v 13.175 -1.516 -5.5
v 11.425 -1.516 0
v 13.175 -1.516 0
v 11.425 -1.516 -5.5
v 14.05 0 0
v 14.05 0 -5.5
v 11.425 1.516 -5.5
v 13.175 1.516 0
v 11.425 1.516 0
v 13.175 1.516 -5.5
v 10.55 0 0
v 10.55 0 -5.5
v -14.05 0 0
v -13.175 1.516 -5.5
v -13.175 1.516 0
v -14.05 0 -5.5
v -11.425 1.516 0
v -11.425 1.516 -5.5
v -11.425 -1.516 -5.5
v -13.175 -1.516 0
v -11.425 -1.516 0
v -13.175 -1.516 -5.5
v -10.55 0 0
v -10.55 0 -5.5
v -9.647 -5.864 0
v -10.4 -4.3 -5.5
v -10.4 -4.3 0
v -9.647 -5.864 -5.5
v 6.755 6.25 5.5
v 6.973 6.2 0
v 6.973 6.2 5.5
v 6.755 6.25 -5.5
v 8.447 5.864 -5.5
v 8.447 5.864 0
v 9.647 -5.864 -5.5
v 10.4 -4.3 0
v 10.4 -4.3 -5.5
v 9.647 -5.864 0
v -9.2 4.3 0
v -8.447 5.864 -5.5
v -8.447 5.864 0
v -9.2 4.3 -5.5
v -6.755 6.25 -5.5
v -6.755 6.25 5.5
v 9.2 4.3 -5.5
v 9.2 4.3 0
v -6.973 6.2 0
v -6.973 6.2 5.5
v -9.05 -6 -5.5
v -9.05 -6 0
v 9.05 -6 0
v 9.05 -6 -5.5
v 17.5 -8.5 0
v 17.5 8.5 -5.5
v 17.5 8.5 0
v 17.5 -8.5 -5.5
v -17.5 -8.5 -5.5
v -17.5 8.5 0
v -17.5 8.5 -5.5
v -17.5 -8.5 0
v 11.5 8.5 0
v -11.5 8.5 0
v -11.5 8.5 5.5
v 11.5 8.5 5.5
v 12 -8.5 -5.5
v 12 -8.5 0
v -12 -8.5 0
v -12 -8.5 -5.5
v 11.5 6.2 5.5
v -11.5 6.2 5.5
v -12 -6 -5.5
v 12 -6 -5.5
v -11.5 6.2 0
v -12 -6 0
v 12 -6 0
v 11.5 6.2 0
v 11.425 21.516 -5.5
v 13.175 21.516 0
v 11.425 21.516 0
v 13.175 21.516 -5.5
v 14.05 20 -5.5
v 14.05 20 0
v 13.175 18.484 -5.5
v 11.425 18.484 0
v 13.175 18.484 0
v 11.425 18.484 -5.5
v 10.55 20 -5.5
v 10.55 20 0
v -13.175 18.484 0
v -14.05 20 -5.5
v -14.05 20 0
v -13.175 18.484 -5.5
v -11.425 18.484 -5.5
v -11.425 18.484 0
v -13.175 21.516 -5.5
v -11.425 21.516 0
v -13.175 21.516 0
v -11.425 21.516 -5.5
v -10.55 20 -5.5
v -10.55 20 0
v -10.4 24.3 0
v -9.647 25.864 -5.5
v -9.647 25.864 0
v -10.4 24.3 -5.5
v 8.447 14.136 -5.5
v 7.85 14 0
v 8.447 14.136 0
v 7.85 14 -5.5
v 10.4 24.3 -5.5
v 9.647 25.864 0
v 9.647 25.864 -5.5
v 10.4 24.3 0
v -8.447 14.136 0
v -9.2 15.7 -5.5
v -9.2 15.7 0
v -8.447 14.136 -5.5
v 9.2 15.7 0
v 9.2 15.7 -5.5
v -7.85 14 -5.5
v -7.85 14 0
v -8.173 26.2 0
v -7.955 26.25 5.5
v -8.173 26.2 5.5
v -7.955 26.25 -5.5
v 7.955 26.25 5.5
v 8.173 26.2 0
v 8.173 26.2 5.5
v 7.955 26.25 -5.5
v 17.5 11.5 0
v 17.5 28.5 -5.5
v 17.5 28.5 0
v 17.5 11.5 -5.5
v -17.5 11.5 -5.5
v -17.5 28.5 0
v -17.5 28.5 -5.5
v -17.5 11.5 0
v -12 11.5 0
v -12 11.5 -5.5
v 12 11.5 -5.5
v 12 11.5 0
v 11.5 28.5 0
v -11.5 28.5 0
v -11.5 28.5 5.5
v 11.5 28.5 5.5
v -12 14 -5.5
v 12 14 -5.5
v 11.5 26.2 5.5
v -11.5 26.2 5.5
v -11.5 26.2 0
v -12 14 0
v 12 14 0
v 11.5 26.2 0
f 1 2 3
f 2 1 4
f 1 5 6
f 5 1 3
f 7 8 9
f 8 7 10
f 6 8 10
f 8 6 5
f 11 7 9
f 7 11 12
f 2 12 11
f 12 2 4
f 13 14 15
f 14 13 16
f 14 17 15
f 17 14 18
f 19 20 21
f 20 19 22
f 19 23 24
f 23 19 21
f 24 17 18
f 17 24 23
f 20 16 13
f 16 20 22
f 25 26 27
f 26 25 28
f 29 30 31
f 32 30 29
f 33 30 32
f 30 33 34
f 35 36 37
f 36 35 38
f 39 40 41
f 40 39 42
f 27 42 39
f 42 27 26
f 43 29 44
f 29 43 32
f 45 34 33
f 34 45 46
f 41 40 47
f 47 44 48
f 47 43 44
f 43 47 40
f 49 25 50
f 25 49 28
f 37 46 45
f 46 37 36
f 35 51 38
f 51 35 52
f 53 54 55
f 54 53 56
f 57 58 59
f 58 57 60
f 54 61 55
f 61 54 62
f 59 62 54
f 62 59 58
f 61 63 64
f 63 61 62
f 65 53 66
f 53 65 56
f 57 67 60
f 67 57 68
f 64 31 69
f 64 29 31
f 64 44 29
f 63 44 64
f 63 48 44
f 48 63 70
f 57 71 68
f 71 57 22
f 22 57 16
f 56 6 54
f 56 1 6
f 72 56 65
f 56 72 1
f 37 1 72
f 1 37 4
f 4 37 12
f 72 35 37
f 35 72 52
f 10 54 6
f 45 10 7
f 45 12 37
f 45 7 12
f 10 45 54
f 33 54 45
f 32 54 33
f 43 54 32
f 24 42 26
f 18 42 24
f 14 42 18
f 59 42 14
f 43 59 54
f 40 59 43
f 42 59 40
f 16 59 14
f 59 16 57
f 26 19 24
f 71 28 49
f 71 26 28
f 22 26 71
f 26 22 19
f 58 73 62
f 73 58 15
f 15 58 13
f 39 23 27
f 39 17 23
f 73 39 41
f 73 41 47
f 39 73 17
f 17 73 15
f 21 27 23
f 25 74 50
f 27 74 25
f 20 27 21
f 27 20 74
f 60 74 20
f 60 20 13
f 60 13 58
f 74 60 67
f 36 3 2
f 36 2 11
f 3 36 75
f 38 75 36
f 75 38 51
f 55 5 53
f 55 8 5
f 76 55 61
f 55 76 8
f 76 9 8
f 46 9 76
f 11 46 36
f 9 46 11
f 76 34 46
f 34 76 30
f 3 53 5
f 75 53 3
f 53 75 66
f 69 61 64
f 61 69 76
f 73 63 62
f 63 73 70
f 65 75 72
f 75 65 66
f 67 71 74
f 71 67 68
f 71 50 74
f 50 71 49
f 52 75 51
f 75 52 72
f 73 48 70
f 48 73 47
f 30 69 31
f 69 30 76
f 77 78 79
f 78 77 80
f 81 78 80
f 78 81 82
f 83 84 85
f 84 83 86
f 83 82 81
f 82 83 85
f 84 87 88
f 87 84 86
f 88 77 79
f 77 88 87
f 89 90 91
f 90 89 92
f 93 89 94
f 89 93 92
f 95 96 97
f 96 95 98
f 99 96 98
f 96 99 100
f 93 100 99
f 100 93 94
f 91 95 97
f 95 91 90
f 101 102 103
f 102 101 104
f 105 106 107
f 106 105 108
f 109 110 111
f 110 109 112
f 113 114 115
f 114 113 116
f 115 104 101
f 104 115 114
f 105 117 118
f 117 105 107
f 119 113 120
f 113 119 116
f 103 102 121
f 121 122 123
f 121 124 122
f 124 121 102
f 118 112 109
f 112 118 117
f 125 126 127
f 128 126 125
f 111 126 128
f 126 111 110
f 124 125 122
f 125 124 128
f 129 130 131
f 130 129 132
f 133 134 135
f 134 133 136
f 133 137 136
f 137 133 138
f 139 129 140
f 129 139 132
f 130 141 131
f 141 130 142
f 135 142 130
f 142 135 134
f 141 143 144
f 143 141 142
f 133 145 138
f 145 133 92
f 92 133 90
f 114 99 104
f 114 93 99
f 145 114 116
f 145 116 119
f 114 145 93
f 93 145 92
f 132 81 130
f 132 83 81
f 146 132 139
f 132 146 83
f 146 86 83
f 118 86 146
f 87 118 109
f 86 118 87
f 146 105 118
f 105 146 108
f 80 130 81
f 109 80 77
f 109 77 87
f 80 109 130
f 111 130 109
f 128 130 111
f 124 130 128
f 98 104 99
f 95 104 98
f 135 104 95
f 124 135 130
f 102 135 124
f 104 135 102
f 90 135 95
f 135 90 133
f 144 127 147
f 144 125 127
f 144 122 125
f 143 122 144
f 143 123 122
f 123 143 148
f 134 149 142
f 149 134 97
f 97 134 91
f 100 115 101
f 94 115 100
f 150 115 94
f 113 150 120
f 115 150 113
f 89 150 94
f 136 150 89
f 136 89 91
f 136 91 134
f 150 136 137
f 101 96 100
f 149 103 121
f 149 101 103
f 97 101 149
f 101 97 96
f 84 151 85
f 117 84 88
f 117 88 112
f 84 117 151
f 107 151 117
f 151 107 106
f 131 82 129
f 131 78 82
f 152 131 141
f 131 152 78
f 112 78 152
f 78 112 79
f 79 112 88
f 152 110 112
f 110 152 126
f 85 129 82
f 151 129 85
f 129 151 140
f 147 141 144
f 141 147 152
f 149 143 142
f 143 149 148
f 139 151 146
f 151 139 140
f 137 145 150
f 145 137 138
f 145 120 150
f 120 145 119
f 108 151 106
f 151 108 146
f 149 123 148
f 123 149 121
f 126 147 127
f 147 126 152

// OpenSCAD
// file: lib/mhop_lib.scad
/*
	mhop_lib

    Autor: Marc Hoppe (mhop@posteo.de), Bielefeld 2018

    This program is free software: you can redistribute it and/or modify
    it under the terms of the GNU General Public License as published by
    the Free Software Foundation, either version 3 of the License, or
    (at your option) any later version.

    This program is distributed in the hope that it will be useful,
    but WITHOUT ANY WARRANTY; without even the implied warranty of
    MERCHANTABILITY or FITNESS FOR A PARTICULAR PURPOSE.  See the
    GNU General Public License for more details.

    You should have received a copy of the GNU General Public License
    along with this program.  If not, see <https://www.gnu.org/licenses/>.
*/

// Requires openscad >= 2016.XX]

use <shortcuts.scad>

*langloch();
*henkel_knick();
*henkel_halb(	h=20,
	b=5,
	ri=10,
	rr=2,
	L=200,
	H=50);
*rounded_prism(10,5,2);
*rounded_ring();



module MMx() { children(); mirror([1, 0, 0]) children(); }
module MMy() { children(); mirror([0, 1, 0]) children(); } 
module MMz() { children(); mirror([0, 0, 1]) children(); }

module langloch_senk(r=2.5,d=8,h=20)
{
	hull() {
	Tx(-d/2) Cy(r1=r, r2=2*r, h=h);
	Tx(+d/2) Cy(r1=r, r2=2*r, h=h);
	}
}

module langloch(r=2.5,d=8,h=20)
{
	hull() {
	Tx(-d/2) Cy(r=r, h=h);
	Tx(+d/2) Cy(r=r, h=h);
	}
}
	
module rounded_box(l,b,h,r,w)
{
	ri=r-w;
	off1=-w*2;
	off2=0;
	D() {
		rounded_cube(l=l+off2, b=b+off2, h=h+off2, r=r);
		rounded_cube(l=l+off1, b=b+off1, h=h+off1, r=ri);
	}
}


module rounded_cube(l,b,h,r=0.1)
{
	T(-l/2+r, -b/2+r, -h/2+r) { 
		d=2*r;
		hull() {
			Sp(r=r);
			Tx(l-d) Sp(r=r);
			Ty(b-d) Sp(r=r);
			Ty(b-d) Tx(l-d) Sp(r=r);
			Tz(h-d) Sp(r=r);
			Tz(h-d) Tx(l-d) Sp(r=r);
			Tz(h-d) Ty(b-d) Sp(r=r);
			Tz(h-d) Ty(b-d) Tx(l-d) Sp(r=r);
		}
	}
}

module rounded_trapez(l1,b1,l2,b2,h,r=0.1)
{
	//T(-l/2+r, -b/2+r, -h/2+r) 
	{ 
		d=2*r;
		
		hull() {
			Sp(r=r);
			Tx(l-d) Sp(r=r);
			Ty(b-d) Sp(r=r);
			Ty(b-d) Tx(l-d) Sp(r=r);
			Tz(h-d) Sp(r=r);
			Tz(h-d) Tx(l-d) Sp(r=r);
			Tz(h-d) Ty(b-d) Sp(r=r);
			Tz(h-d) Ty(b-d) Tx(l-d) Sp(r=r);
		}
	}
}

module rounded_prism(a,b,h,r=0.1)
{
	//T(-a/2+r, -b/2+r, -h/2+r) 
	{ 
		d=2*r;
		hull() {
			Sp(r=r);
			Tx(a-d) Sp(r=r);
			Ty(b-d) Sp(r=r);
			Tz(h-d) Sp(r=r);
			Tz(h-d) Tx(a-d) Sp(r=r);
			Tz(h-d) Ty(b-d) Sp(r=r);
		}
	}
}

module zeppelin(r=5,h=20)
{
	Tz(h/2-r)    Sp(r=r);
	Tz(0)        Cy(r=r, h=h-2*r);
	Tz(-(h/2-r)) Sp(r=r);
}

module henkel(
	h=20,
	b=5,
	ri=10,
	rr=2,
	L=200,
	H=50
)
{
	hm=H-ri-b-2*rr;

	Ty(hm-H/2) {
	henkel_halb(h,b,ri,rr,L,H);
	Mx(1)
		henkel_halb(h,b,ri,rr,L,H);
	}
}

module henkel_knick(
	h=25,
	b=8,
	ri=10,
	rr=2,
	L=200,
	H=40,
  w=20
)
{
	hm=H-ri-b-2*rr;
	D() {
	U() {
	Ty(hm-H/2) {
	Tx(L/2-b-ri-2*rr)henkel_halb(h,b,ri,rr,L,H);
	Rz(w) Mx(1)
		Tx(L/2-b-ri-2*rr)henkel_halb(h,b,ri,rr,L,H);
  Ty() Rz(90)rounded_ring(ri=ri, h=h, b=b, rr=rr, w=w);
	}
}
	Ty(-L/2-H/2) Rx(-90) Cy(r=L, h=L);
}
}

module henkel_halb(h,b,ri,rr,L,H)
	{
	lm=L-2*ri-4*rr-2*b;
	hm=H-ri-b-2*rr;

	Tx(lm/2) 
		rounded_ring(ri=ri, h=h, b=b, rr=rr, w=90);
	Ty(ri+b/2+rr/2) 
		rounded_block(h=h, b=b, l=lm, rr=rr);
	Ty(-hm/2) Tx(L/2-b/2-rr-rr/2) Rz(90) 
		rounded_block(h=h, b=b, l=hm, rr=rr);
	}


module rounded_ring(ri=100, h=50, b=10, rr=10, w=360)
{
	r=ri+rr/2;
	Tz(-h/2)
rotate_extrude(angle=w) 
	Tx(r) { 
		Ci(r = rr) ;
		Ty(h) Ci(r=rr);
		Tx(b) Ci(r=rr);
		Tx(b) Ty(h) Ci(r=rr);
		Tx(b/2) Ty(h/2) square([b,2*rr+h], center=true);
		Tx(b/2) Ty(h/2) square([b+2*rr,h], center=true);
		
		
		}
}


module rounded_block(l=100, h=50, b=10, rr=10)
{
	Rx(90) Ry(90) Tx(-b/2) Tz(-l/2) Ty(-h/2) 
	linear_extrude(height=l) 
	{ 
		Ci(r = rr) ;
		Ty(h) Ci(r=rr);
		Tx(b) Ci(r=rr);
		Tx(b) Ty(h) Ci(r=rr);
		Tx(b/2) Ty(h/2) square([b,2*rr+h], center=true);
		Tx(b/2) Ty(h/2) square([b+2*rr,h], center=true);
		
		
		}
}



module fillet(r=1.0,steps=3,include=true) 
{
    if(include) for (k=[0:$children-1]) 
    {
        children(k);
    }
    for (i=[0:$children-2] ) 
    {
        for(j=[i+1:$children-1] ) 
        {
            fillet_two(r=r,steps=steps) 
            {
                children(i);
                children(j);
                intersection() 
                {
                    children(i);
                    children(j);
                }
            }
        }
    }
}

module fillet_two(r=1.0,steps=3) 
{
    for(step=[1:steps]) 
    {
        hull() 
        {
            render() intersection() 
            {
                children(0);
                offset_3d(r=r*step/steps) children(2);
            }
            render() intersection() 
            {
                children(1);
                offset_3d(r=r*(steps-step+1)/steps) children(2);
            }
        }
    }
}

module offset_3d(r=1.0) 
{
    for(k=[0:$children-1]) minkowski() 
    {
        children(k);
        sphere(r=r,$fn=8);
    }
}
// main file
//

use <lib/shortcuts.scad>
use <lib/mhop_lib.scad>

h=12;
r=3.5/2;

module spacer(h)
{
    /*D() {
        Tz(-2.5) Ty(-6.5) Tx(-15.7) import("DB9_Spacer_5mm_OS.STL");
        MMx() Tx(12.3) Cy(r=1.6, h=20);
    }
    */

    D() {
        Tz() Cu(35, 17, 1);
        MMx() Tx(12.3) Cy(r=r, h=10);
        hull() MMx() {
            Tx(6.2+1) Ty(3.3+1) Cy(r=2, h=10);
            Tx(7.4+1) Ty(-3.3-1) Cy(r=2, h=10);
        }
    }

}

module spacerh(h)
{
    
    Tz(+h/4) spacer();
    Tz(-h/4) spacer();
    Sz((h-1)/1) spacer();
}

*Tz(10) spacer();



D() {
    spacerh(h);    
    //Tx() Ty(-7) Cu(12.5, 4, 15);
    //MMx() Tx(12/2+12/2) Tz(5) Cu(12, 20, 10);
    Tx() Ty(-8) Cu(24, 4, 15);
    MMx() Tx(12/2+23/2) Tz(h/2) Cu(12, 20, h);
    Ty(-1.8) Tz(h/2) Cu(25, 16, h);
}


Ty(20)
Rx(180) D() {
    spacerh(h);    
    //My() Tx() Ty(-7) Cu(12.5,4,15);
    //MMx() Tx(12/2+12/2) Tz(-5) Cu(12,20,10);
    Tx() Ty(+8) Cu(24, 4, 15);
    MMx() Tx(12/2+23/2) Tz(-h/2) Cu(12, 20, h);
    Ty(1.8) Tz(-h/2) Cu(25, 16, h);
}
